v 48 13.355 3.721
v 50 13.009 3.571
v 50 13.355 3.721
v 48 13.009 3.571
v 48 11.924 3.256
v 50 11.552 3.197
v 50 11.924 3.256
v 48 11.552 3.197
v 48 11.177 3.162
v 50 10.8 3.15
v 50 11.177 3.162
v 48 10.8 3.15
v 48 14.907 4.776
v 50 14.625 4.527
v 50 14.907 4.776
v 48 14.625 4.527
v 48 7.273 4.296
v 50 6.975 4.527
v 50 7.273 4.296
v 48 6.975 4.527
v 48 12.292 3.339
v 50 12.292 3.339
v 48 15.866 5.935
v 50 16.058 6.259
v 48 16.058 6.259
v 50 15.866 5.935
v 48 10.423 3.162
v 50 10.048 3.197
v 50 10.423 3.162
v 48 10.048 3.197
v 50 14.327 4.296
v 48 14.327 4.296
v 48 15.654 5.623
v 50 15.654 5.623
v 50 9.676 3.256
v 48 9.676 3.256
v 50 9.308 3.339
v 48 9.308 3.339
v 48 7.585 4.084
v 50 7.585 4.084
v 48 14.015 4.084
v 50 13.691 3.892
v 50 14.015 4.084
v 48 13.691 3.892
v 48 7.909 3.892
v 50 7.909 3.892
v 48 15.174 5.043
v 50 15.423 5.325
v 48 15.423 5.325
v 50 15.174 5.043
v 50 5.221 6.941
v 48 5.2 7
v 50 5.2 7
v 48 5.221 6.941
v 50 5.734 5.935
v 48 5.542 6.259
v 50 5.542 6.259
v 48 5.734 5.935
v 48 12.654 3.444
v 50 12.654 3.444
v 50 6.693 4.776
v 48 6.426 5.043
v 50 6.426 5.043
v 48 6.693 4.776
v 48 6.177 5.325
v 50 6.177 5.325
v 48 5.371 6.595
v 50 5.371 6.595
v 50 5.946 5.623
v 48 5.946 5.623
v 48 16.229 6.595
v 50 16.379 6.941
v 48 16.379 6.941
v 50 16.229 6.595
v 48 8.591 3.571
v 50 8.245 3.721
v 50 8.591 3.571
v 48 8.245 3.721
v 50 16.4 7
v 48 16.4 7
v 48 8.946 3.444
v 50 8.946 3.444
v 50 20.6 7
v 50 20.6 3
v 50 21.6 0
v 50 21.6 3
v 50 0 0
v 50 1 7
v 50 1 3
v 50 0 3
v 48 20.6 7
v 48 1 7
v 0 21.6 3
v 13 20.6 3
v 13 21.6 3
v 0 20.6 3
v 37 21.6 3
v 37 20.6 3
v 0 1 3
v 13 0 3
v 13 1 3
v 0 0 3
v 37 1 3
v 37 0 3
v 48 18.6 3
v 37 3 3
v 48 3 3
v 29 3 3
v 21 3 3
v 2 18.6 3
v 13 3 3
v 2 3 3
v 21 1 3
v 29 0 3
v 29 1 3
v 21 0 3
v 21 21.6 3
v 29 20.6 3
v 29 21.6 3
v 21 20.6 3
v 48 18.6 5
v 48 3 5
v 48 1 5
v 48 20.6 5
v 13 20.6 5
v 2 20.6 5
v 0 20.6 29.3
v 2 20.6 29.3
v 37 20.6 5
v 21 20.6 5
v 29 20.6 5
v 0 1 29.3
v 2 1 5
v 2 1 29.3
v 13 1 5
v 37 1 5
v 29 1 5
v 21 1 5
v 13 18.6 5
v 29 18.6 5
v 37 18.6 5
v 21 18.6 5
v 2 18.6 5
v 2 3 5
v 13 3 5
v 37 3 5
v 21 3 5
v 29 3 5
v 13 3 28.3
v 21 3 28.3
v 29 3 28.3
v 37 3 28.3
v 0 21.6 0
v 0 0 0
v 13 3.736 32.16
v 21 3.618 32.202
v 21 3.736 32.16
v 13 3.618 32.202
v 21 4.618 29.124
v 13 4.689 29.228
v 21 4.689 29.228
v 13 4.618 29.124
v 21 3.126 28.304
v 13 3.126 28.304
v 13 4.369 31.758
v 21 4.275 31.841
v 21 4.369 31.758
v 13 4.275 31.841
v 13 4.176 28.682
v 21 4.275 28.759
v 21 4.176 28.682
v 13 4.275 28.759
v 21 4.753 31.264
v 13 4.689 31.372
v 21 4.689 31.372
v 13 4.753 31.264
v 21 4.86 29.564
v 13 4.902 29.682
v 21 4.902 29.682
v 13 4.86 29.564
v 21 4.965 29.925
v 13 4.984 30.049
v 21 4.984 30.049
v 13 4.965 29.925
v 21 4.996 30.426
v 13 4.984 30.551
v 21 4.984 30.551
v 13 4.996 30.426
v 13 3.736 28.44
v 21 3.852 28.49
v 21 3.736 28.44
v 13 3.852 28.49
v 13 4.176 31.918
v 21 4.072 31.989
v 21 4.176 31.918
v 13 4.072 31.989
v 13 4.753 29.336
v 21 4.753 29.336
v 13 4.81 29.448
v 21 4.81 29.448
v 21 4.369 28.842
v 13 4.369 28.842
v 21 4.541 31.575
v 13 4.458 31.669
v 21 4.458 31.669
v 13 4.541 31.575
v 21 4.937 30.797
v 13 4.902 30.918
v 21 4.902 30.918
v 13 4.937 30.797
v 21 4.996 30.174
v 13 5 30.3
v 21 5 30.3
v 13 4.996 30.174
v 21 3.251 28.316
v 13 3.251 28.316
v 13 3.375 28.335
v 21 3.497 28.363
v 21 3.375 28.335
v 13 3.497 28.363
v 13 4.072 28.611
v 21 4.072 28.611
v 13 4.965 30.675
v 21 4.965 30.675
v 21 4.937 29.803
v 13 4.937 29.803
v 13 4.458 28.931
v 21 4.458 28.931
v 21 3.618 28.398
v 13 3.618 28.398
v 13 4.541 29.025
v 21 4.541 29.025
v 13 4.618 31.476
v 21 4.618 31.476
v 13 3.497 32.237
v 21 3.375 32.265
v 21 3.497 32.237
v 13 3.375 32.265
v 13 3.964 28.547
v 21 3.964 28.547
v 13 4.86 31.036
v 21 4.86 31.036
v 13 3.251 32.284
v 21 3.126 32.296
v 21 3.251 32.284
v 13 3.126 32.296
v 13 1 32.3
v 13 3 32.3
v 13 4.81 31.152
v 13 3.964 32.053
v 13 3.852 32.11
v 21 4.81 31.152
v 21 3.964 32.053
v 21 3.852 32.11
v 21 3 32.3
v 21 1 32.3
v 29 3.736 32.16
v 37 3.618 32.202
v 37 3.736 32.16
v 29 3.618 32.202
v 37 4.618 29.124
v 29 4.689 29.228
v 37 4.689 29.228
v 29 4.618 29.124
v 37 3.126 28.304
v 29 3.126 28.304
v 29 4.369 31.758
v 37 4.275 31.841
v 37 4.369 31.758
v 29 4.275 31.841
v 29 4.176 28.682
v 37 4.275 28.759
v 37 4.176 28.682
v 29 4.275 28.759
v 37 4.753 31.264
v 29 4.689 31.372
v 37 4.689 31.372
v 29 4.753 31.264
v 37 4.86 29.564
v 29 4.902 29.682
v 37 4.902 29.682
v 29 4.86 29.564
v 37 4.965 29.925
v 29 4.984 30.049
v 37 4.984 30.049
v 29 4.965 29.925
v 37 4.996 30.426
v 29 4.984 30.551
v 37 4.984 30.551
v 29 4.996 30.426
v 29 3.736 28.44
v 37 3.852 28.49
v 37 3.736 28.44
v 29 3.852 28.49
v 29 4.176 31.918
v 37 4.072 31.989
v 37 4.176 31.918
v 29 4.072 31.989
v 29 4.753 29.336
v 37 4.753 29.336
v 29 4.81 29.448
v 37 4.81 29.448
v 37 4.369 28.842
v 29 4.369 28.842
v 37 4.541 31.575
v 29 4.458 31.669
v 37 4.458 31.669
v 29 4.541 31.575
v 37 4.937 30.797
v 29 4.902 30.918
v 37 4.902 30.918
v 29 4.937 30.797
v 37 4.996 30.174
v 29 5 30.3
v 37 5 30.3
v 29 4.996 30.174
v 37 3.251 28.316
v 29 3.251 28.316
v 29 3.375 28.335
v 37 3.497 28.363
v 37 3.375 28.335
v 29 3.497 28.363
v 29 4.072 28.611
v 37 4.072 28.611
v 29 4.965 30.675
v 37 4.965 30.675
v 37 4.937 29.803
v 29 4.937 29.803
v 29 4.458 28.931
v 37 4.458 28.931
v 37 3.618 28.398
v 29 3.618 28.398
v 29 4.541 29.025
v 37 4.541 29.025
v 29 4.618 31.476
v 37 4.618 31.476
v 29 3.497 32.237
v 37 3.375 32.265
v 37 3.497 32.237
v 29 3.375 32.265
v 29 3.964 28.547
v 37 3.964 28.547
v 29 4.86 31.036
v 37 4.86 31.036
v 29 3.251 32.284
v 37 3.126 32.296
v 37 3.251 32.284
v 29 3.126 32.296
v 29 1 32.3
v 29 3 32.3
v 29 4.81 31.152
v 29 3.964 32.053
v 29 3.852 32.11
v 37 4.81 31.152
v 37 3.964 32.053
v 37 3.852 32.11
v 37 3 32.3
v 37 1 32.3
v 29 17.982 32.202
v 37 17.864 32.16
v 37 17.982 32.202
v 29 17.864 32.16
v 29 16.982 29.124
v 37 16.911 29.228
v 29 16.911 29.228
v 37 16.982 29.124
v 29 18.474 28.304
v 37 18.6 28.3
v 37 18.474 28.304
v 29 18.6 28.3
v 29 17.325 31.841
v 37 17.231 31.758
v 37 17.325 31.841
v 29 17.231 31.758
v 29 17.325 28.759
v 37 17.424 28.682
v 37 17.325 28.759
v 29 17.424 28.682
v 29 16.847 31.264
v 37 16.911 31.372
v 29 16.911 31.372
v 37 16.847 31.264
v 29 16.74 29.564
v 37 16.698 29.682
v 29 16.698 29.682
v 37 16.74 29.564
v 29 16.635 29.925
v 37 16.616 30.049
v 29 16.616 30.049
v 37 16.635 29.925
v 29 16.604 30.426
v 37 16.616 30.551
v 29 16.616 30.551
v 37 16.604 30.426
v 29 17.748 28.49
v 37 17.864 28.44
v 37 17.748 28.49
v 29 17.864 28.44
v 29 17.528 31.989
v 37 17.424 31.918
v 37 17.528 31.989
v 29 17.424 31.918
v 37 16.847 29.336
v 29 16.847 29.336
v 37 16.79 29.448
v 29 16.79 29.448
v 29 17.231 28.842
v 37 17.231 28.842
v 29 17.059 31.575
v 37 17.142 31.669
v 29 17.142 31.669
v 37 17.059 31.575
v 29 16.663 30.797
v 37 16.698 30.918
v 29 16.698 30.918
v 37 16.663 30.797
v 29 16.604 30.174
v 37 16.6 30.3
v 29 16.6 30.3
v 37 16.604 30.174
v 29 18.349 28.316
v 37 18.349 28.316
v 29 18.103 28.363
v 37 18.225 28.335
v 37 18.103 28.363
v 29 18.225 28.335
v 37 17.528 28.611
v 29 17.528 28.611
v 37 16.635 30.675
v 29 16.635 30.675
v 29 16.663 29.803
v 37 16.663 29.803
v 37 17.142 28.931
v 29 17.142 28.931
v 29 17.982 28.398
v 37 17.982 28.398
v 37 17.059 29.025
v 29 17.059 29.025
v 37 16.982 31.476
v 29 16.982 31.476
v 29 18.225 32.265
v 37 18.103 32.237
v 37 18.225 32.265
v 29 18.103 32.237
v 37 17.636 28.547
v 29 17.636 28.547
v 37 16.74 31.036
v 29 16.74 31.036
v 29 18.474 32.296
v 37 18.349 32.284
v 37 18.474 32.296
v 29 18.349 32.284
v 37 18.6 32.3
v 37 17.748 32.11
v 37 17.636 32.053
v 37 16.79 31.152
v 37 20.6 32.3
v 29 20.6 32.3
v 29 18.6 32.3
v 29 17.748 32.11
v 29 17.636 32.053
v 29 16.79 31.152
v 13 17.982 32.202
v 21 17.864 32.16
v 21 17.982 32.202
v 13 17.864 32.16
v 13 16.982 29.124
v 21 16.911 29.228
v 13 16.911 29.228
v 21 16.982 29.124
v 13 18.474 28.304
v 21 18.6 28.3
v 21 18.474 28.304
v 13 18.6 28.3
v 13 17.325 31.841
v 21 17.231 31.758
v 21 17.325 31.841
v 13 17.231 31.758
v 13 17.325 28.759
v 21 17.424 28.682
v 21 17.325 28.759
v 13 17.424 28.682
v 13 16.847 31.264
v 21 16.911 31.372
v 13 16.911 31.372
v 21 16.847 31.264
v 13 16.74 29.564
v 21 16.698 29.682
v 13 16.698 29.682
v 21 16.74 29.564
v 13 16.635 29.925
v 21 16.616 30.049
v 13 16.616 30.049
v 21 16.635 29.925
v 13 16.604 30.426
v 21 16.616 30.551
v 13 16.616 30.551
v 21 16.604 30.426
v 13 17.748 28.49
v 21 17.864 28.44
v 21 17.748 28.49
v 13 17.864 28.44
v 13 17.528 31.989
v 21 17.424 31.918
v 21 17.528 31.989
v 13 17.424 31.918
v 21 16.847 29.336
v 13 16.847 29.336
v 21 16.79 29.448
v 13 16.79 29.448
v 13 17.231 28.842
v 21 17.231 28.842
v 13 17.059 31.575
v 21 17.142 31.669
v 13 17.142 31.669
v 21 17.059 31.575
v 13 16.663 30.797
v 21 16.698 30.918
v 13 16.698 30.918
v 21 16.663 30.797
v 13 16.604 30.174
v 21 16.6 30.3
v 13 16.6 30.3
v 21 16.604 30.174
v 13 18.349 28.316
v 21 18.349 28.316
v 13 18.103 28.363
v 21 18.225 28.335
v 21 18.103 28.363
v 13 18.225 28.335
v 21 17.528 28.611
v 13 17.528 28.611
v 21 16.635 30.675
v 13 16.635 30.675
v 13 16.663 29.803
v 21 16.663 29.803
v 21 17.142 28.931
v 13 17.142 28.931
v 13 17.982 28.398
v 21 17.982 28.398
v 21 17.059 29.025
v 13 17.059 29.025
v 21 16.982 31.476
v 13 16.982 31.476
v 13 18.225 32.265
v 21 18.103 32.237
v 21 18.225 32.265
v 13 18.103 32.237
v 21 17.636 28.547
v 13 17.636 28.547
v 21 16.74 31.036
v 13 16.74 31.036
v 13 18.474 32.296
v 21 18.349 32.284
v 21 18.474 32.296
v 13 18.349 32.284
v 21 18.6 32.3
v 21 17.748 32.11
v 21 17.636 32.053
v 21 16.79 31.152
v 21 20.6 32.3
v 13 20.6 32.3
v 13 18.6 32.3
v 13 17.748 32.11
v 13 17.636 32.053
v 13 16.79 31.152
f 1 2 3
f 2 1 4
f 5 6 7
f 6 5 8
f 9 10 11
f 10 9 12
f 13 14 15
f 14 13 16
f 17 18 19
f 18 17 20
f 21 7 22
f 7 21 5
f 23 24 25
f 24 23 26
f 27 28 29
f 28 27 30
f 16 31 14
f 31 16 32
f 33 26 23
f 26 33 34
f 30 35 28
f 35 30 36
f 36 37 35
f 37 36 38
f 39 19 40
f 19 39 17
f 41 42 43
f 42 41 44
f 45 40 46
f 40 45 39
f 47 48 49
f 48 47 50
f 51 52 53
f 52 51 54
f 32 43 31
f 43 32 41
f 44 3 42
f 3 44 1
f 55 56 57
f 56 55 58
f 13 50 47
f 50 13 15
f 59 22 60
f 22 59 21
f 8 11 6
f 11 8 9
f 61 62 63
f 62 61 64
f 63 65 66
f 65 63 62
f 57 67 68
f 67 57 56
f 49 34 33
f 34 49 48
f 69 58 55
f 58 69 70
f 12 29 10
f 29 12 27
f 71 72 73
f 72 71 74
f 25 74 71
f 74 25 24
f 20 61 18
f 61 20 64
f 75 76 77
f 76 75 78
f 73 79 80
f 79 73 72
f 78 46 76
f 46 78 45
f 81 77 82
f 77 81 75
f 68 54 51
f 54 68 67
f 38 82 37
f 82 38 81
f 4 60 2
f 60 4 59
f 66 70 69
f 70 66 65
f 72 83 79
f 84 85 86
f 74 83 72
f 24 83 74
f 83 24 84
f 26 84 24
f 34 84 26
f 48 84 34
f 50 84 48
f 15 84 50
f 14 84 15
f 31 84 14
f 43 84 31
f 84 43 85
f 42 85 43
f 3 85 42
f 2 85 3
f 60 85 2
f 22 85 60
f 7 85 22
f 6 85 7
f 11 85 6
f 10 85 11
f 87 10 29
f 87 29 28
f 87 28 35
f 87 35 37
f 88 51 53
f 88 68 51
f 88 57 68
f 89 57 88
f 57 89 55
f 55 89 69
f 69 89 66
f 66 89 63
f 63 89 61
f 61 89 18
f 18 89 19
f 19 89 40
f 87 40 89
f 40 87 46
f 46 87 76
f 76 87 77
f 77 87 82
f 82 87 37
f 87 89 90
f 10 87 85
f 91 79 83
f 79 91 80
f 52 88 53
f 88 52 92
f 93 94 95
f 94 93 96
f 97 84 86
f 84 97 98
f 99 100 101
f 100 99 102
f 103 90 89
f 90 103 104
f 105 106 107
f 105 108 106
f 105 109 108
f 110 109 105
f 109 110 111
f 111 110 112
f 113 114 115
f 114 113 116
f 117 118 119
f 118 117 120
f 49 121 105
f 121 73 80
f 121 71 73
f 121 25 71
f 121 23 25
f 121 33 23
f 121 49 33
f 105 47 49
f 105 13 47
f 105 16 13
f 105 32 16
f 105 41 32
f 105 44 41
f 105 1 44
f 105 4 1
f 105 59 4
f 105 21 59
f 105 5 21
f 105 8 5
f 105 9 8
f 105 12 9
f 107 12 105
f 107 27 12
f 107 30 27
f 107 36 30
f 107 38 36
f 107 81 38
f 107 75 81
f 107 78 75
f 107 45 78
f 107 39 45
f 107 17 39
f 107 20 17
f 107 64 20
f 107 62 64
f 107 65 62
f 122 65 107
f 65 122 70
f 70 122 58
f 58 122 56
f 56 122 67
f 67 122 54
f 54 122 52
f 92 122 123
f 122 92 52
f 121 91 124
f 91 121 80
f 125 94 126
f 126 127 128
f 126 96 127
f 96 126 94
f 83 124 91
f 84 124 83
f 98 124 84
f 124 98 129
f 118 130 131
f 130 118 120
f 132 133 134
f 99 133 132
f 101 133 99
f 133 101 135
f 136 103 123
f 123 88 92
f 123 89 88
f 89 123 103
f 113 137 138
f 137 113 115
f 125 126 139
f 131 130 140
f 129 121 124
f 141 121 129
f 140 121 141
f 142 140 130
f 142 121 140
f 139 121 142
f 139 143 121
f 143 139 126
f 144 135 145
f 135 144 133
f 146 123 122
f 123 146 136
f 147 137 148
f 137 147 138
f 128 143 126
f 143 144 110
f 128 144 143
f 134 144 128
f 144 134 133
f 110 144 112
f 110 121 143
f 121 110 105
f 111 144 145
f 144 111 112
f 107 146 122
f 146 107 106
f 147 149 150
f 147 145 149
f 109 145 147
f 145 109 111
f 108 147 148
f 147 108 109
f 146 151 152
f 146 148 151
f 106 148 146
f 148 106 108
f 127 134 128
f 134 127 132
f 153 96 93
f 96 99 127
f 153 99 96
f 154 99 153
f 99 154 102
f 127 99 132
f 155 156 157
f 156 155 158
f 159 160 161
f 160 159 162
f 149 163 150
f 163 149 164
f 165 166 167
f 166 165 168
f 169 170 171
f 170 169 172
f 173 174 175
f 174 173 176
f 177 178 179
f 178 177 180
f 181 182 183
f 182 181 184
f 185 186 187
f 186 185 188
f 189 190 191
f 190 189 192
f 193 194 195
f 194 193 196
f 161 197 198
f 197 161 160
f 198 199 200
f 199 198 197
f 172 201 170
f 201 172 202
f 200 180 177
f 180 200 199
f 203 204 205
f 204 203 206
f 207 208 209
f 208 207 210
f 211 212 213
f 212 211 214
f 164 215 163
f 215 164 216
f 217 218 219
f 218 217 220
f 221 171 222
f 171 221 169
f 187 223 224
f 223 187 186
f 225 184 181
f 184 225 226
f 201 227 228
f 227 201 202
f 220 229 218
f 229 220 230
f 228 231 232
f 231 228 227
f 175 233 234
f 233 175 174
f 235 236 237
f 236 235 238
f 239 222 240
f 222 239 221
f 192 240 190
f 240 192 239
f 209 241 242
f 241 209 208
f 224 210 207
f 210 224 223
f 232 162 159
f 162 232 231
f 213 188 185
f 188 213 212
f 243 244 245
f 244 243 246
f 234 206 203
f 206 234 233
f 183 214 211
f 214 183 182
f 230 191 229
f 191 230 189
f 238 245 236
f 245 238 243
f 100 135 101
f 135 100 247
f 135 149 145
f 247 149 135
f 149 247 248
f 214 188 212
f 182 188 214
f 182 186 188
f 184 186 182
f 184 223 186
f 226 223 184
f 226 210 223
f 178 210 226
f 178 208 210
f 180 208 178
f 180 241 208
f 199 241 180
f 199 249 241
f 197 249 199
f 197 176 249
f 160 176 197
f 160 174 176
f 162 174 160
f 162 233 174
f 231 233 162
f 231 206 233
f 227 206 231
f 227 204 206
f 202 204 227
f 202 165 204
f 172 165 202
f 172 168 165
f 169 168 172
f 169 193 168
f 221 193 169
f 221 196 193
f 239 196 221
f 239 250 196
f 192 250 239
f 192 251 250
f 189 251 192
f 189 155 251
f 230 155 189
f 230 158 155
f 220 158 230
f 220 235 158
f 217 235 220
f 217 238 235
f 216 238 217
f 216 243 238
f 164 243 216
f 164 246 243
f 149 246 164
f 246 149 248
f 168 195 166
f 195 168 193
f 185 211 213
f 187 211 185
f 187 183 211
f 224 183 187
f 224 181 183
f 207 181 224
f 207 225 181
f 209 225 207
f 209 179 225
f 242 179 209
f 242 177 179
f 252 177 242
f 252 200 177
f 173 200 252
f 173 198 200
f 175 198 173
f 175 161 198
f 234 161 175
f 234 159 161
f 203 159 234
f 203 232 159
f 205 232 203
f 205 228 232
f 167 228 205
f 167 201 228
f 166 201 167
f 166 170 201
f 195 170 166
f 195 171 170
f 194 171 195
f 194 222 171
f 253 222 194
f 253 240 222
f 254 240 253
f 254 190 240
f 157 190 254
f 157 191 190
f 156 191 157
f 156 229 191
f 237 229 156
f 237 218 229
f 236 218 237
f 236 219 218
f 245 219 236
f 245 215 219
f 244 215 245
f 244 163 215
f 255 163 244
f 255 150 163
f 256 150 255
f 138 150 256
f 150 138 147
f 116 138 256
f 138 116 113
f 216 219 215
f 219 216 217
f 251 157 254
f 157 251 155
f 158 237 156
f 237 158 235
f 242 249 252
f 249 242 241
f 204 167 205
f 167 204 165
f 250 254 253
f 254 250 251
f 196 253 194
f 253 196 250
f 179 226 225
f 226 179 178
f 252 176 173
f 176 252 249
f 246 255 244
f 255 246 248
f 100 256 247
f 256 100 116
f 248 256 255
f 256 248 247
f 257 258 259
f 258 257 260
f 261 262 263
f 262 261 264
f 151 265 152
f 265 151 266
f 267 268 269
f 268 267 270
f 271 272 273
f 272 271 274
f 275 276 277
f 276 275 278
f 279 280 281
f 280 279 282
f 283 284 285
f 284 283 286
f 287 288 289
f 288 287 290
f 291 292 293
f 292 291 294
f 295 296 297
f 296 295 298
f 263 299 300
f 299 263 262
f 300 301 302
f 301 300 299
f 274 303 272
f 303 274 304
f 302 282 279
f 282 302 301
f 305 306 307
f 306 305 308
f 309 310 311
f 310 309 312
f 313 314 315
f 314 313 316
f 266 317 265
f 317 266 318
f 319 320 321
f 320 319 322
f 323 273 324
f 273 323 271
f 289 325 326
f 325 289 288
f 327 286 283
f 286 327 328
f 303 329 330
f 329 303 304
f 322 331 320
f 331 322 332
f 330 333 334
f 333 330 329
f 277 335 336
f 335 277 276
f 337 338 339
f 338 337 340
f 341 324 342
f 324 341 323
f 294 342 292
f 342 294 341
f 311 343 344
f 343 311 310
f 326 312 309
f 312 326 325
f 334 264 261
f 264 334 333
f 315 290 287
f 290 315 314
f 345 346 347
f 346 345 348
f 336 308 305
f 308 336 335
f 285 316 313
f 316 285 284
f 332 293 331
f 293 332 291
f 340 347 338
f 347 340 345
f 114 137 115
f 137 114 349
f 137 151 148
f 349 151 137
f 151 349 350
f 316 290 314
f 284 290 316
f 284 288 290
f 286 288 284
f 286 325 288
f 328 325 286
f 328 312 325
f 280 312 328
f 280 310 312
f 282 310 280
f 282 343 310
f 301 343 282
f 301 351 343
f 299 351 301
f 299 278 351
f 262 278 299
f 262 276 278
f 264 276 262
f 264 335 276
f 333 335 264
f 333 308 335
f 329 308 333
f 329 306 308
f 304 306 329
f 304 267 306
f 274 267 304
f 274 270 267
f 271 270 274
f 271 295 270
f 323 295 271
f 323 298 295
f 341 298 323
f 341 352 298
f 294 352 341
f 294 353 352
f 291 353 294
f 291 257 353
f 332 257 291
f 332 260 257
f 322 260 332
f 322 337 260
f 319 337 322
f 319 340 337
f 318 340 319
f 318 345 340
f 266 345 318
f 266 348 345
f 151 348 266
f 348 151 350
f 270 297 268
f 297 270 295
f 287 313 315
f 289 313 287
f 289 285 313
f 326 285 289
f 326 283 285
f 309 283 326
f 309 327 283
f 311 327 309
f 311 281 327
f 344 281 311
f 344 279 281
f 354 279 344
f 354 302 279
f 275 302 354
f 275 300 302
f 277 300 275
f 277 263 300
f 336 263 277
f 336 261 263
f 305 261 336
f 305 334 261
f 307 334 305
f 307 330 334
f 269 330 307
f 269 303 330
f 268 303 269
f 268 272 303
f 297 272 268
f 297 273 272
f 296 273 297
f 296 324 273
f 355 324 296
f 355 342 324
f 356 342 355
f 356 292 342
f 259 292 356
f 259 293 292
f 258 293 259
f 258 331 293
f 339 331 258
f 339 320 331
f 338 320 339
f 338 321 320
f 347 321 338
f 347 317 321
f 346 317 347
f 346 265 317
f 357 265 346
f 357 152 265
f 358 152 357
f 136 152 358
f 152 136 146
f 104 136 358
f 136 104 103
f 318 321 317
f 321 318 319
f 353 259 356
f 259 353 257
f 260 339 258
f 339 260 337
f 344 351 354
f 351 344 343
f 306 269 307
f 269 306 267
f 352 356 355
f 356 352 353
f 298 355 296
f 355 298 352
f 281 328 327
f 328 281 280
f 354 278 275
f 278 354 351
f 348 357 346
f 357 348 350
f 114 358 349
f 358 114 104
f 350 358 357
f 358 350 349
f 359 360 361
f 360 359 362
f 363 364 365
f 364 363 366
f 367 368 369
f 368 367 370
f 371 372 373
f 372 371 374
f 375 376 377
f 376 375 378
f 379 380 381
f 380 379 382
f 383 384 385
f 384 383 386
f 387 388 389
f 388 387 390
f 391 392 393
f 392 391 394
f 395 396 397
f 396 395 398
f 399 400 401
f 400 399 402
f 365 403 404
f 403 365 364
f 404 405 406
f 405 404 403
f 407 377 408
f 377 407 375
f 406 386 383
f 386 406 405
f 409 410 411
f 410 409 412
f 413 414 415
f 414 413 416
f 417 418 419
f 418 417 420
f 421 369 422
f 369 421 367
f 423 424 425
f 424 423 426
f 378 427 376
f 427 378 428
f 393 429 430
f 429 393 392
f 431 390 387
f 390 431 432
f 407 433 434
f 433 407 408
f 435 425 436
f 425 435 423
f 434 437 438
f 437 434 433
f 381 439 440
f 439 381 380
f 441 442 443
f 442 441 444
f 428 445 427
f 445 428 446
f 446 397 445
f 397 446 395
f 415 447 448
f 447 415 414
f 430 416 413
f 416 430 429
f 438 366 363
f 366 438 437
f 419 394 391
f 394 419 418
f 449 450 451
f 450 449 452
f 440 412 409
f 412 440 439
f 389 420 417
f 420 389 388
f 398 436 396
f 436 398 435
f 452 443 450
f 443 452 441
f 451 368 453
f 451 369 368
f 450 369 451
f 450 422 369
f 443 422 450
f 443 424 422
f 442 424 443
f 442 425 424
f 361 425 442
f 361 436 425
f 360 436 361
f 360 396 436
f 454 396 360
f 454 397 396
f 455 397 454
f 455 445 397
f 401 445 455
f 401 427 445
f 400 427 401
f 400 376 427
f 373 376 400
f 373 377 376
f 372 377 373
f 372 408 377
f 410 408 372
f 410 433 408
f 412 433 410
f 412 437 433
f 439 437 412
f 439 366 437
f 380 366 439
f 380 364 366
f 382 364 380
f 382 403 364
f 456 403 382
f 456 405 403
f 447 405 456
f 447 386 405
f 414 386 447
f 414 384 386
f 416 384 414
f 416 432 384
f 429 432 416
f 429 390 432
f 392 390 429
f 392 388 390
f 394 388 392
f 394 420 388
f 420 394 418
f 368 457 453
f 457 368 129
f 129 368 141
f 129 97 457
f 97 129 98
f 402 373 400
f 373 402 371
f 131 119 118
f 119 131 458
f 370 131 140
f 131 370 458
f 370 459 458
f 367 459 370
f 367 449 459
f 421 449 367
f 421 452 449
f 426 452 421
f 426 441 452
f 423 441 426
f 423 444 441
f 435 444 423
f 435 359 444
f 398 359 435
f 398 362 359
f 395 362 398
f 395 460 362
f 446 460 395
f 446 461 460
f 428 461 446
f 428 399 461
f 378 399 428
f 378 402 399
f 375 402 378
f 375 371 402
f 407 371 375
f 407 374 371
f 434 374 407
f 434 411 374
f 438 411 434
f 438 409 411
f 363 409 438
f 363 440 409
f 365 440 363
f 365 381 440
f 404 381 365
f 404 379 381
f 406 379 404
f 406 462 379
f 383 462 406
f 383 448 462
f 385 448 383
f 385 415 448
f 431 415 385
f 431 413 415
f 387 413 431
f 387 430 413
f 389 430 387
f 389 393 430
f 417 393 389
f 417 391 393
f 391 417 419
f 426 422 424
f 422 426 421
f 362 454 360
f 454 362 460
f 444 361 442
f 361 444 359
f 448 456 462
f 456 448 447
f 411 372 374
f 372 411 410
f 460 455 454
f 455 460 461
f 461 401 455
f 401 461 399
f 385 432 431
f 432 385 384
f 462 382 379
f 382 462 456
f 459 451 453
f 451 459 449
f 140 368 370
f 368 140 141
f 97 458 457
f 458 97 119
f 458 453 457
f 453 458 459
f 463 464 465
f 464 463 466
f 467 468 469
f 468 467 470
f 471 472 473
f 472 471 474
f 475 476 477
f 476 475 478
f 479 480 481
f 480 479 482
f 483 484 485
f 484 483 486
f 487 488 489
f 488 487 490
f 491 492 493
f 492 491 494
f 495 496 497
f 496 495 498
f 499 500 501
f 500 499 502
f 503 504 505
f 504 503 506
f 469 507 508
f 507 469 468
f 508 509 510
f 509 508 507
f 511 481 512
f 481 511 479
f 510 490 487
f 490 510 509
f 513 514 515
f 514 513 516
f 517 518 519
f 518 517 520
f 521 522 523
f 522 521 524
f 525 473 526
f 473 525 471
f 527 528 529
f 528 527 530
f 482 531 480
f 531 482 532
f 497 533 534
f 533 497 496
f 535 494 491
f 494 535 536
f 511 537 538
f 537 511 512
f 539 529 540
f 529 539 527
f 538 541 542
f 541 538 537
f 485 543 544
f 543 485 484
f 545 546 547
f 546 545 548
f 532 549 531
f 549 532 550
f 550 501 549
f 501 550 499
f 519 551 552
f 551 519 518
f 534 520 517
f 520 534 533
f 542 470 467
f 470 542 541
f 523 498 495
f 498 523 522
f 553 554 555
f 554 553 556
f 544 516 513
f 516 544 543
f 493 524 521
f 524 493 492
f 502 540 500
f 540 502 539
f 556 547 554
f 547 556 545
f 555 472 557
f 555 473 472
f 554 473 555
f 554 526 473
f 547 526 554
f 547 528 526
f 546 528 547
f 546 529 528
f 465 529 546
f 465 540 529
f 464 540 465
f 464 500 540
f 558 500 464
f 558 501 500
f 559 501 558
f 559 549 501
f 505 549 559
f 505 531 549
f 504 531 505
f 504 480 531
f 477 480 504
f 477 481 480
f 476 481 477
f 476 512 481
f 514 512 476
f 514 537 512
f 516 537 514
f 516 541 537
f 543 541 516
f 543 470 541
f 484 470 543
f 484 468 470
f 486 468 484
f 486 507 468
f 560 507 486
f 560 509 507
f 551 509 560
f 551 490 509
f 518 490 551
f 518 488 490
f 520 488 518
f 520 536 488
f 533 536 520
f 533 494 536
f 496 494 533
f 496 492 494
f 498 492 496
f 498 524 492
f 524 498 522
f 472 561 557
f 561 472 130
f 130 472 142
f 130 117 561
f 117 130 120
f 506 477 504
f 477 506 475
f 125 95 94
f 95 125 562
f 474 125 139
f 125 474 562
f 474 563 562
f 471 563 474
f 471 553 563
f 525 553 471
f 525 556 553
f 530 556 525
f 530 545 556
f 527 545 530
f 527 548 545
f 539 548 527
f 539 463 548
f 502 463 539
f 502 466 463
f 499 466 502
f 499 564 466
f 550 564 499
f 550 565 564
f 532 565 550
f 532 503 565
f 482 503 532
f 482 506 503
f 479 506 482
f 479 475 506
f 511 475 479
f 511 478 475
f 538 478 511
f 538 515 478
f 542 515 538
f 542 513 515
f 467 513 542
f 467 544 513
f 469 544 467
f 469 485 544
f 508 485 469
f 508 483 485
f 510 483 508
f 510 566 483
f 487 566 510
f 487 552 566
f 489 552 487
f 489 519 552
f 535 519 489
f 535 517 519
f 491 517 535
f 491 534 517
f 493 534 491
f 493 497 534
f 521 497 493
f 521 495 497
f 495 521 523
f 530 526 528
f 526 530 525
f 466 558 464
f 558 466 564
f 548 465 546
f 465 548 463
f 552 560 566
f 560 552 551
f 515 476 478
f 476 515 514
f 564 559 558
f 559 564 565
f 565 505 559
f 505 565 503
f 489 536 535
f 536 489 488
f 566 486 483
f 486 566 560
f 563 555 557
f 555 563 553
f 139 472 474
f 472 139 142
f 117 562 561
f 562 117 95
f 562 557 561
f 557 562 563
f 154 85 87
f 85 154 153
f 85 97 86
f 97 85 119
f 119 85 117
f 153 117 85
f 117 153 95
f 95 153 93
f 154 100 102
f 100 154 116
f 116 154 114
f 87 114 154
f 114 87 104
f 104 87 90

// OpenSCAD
// sof
// ------------------------------------------------------------------
//
// Autor: Ivo Panáček, January 2021
// ivo.panacek@gmail.com
// Version: 0
//
// ------------------------------------------------------------------
// parameters

batteryHeight = 46;

batteryWidth = 26.3;
batteryThickness = 15.6;

batteryTopDelta = 4-batteryWidth;

batteryPinRadius = 6;
batteryPinDistance = 14;
batteryPinHeight = 2.2;

clipStartDelta = -1;
clipWidth = 8;
clipBase = 3;
clipTop = 2;
clipRadius = 2;
clipDistance = 8;

wallThickness = 2;
rimHeight = 2;

bottomThickness = 3;
bottomPaddingXbottom = 0;
bottomPaddingXtop = 0;
bottomPaddingY = 1;

dreh=$t*360;
$fn=100;

// ------------------------------------------------------------------
// main program

//realBatteryInSpace();

fullHolder();

// ------------------------------------------------------------------
// modules

module fullHolder() {
    bottom();
    translate([bottomPaddingXbottom,bottomPaddingY,bottomThickness])
    union() {
        batteryBase();
        batteryClips();
    }
}

// -----------------------------------------

module batteryClips() {
    size = 2*clipWidth+clipDistance;
    margin = (batteryHeight-size)/2;
    color([0,1,1])
    translate([margin+wallThickness,wallThickness,0])
    union() {
        batterySideClips();
        translate([size,batteryThickness,0])
        rotate([0,0,180])
        batterySideClips();
    }
}

module batterySideClips() {
    union() {
        batteryClip();
        translate([clipWidth+clipDistance,0,0])
        batteryClip();
    }
}

module batteryClip() {
    d = 2*clipRadius;
    h = batteryWidth + d + clipStartDelta;
    x = clipWidth;
    y = clipTop;
    z = h;
    y0 = clipTop-clipBase;

    points = [
        [ 0, y0, 0], // 0
        [ x, y0, 0], // 1
        [ x, y, 0], // 2
        [ 0, y, 0], // 3
        [ 0, 0, z], // 4
        [ x, 0, z], // 5
        [ x, y, z], // 6
        [ 0, y, z] // 7
    ];

    faces = [
        [0,1,2,3],  // bottom
        [4,5,1,0],  // front
        [7,6,5,4],  // top
        [5,6,2,1],  // right
        [6,7,3,2],  // back
        [7,4,0,3] // left
    ];

    //translate([0,-clipTop,0])
    union() {
        // cube([x,y,z]);
        translate([0,-clipTop,0])
        polyhedron( points, faces );

        translate([0,0,h-clipRadius])
        difference() {
            rotate([0,90,0])
            cylinder(r=clipRadius,h=clipWidth);
            translate([-clipWidth,-d,-d])
            cube([3*clipWidth,d,2*d]);
        }
    }
}

// -----------------------------------------

module batteryBase() {
    union() {
        batteryBottom();
        batteryTop();
        batteryRim();
    }
}

// -----------------------------------------

module batteryPins() {
    d = 2*batteryPinRadius;
    left = batteryWidth-batteryPinDistance-d;
    margin = left / 2;
    color([1,0,1])
    translate([-wallThickness,wallThickness,batteryThickness/2])
    union() {
        translate([0, margin+batteryPinRadius, 0])
        batteryPin();
        translate([0, margin+batteryPinRadius+batteryPinDistance, 0])
        batteryPin();        
        batteryPinBridge();
    }
}

module batteryPinBridge() {
    union() {
        translate([ 0, batteryPinRadius+wallThickness, -batteryPinRadius])
        cube([3*wallThickness, batteryPinDistance, batteryThickness]);
    }
}

module batteryPin() {
    x = 3*wallThickness;
    union() {
        rotate([0,90,0])
        cylinder(r = batteryPinRadius, h = x);
        translate([0,-batteryPinRadius,0])
        cube([x, 2*batteryPinRadius, batteryWidth*2]);
    }
}

module batteryTop() {
    d = 2*batteryPinRadius;
    left = batteryWidth-batteryPinDistance-d;
    margin = left / 2;
    color([1,1,0])
    translate([wallThickness+batteryHeight, 0, 0])
    difference() {
        cube([wallThickness, batteryThickness + 2*wallThickness, batteryWidth+batteryTopDelta]);
        color([0,1,1])
        translate([-wallThickness,wallThickness+batteryThickness/2,batteryPinRadius+margin])
        batteryPin();
    }
}

// -----------------------------------------

module batteryRim() {
    color([0,0,1])
    translate([wallThickness,0,0])
    difference() {
        cube([batteryHeight,batteryThickness+2*wallThickness,rimHeight]);
        translate([-rimHeight,wallThickness,-rimHeight])
        cube([batteryHeight+2*rimHeight, batteryThickness, 3*rimHeight]);
    }
}

// -----------------------------------------

module batteryBottom() {
    color([1,1,0])
    //cube([wallThickness, batteryThickness + 2*wallThickness, batteryWidth+2*clipRadius+clipStartDelta]);
    cube([wallThickness, batteryThickness + 2*wallThickness, batteryWidth]);
}

module bottom(){
  x = bottomPaddingXbottom+bottomPaddingXtop + batteryHeight + 2*wallThickness;
  y = 2*bottomPaddingY + batteryThickness + 2*wallThickness;
  z = bottomThickness;
  color([1,0,0]) cube([x,y,z]);
}

// ---------------------------------------
// just to see battery

module realBatteryInSpace() {
    translate([wallThickness+bottomPaddingXbottom,wallThickness+bottomPaddingY,bottomThickness])
    realBattery();
}

module realBattery() {
    color([0,1,0])
    translate([0,batteryThickness,0])
    rotate([90,0,0])
    union() {
        cube([batteryHeight, batteryWidth, batteryThickness]);
        translate([batteryHeight,0,0])
        realBatteryPins();
    }
}

module realBatteryPins() {
    d = 2*batteryPinRadius;
    left = batteryWidth-batteryPinDistance-d;
    margin = left / 2;
    translate([0,0,batteryThickness/2])
    union() {
        translate([0, margin+batteryPinRadius, 0])
        realBatteryPin();
        translate([0, margin+batteryPinRadius+batteryPinDistance, 0])
        realBatteryPin();
    }
}

module realBatteryPin() {
    rotate([0,90,0])
    cylinder(r = batteryPinRadius, h = batteryPinHeight);
}



// ------------------------------------------------------------------
// eof
